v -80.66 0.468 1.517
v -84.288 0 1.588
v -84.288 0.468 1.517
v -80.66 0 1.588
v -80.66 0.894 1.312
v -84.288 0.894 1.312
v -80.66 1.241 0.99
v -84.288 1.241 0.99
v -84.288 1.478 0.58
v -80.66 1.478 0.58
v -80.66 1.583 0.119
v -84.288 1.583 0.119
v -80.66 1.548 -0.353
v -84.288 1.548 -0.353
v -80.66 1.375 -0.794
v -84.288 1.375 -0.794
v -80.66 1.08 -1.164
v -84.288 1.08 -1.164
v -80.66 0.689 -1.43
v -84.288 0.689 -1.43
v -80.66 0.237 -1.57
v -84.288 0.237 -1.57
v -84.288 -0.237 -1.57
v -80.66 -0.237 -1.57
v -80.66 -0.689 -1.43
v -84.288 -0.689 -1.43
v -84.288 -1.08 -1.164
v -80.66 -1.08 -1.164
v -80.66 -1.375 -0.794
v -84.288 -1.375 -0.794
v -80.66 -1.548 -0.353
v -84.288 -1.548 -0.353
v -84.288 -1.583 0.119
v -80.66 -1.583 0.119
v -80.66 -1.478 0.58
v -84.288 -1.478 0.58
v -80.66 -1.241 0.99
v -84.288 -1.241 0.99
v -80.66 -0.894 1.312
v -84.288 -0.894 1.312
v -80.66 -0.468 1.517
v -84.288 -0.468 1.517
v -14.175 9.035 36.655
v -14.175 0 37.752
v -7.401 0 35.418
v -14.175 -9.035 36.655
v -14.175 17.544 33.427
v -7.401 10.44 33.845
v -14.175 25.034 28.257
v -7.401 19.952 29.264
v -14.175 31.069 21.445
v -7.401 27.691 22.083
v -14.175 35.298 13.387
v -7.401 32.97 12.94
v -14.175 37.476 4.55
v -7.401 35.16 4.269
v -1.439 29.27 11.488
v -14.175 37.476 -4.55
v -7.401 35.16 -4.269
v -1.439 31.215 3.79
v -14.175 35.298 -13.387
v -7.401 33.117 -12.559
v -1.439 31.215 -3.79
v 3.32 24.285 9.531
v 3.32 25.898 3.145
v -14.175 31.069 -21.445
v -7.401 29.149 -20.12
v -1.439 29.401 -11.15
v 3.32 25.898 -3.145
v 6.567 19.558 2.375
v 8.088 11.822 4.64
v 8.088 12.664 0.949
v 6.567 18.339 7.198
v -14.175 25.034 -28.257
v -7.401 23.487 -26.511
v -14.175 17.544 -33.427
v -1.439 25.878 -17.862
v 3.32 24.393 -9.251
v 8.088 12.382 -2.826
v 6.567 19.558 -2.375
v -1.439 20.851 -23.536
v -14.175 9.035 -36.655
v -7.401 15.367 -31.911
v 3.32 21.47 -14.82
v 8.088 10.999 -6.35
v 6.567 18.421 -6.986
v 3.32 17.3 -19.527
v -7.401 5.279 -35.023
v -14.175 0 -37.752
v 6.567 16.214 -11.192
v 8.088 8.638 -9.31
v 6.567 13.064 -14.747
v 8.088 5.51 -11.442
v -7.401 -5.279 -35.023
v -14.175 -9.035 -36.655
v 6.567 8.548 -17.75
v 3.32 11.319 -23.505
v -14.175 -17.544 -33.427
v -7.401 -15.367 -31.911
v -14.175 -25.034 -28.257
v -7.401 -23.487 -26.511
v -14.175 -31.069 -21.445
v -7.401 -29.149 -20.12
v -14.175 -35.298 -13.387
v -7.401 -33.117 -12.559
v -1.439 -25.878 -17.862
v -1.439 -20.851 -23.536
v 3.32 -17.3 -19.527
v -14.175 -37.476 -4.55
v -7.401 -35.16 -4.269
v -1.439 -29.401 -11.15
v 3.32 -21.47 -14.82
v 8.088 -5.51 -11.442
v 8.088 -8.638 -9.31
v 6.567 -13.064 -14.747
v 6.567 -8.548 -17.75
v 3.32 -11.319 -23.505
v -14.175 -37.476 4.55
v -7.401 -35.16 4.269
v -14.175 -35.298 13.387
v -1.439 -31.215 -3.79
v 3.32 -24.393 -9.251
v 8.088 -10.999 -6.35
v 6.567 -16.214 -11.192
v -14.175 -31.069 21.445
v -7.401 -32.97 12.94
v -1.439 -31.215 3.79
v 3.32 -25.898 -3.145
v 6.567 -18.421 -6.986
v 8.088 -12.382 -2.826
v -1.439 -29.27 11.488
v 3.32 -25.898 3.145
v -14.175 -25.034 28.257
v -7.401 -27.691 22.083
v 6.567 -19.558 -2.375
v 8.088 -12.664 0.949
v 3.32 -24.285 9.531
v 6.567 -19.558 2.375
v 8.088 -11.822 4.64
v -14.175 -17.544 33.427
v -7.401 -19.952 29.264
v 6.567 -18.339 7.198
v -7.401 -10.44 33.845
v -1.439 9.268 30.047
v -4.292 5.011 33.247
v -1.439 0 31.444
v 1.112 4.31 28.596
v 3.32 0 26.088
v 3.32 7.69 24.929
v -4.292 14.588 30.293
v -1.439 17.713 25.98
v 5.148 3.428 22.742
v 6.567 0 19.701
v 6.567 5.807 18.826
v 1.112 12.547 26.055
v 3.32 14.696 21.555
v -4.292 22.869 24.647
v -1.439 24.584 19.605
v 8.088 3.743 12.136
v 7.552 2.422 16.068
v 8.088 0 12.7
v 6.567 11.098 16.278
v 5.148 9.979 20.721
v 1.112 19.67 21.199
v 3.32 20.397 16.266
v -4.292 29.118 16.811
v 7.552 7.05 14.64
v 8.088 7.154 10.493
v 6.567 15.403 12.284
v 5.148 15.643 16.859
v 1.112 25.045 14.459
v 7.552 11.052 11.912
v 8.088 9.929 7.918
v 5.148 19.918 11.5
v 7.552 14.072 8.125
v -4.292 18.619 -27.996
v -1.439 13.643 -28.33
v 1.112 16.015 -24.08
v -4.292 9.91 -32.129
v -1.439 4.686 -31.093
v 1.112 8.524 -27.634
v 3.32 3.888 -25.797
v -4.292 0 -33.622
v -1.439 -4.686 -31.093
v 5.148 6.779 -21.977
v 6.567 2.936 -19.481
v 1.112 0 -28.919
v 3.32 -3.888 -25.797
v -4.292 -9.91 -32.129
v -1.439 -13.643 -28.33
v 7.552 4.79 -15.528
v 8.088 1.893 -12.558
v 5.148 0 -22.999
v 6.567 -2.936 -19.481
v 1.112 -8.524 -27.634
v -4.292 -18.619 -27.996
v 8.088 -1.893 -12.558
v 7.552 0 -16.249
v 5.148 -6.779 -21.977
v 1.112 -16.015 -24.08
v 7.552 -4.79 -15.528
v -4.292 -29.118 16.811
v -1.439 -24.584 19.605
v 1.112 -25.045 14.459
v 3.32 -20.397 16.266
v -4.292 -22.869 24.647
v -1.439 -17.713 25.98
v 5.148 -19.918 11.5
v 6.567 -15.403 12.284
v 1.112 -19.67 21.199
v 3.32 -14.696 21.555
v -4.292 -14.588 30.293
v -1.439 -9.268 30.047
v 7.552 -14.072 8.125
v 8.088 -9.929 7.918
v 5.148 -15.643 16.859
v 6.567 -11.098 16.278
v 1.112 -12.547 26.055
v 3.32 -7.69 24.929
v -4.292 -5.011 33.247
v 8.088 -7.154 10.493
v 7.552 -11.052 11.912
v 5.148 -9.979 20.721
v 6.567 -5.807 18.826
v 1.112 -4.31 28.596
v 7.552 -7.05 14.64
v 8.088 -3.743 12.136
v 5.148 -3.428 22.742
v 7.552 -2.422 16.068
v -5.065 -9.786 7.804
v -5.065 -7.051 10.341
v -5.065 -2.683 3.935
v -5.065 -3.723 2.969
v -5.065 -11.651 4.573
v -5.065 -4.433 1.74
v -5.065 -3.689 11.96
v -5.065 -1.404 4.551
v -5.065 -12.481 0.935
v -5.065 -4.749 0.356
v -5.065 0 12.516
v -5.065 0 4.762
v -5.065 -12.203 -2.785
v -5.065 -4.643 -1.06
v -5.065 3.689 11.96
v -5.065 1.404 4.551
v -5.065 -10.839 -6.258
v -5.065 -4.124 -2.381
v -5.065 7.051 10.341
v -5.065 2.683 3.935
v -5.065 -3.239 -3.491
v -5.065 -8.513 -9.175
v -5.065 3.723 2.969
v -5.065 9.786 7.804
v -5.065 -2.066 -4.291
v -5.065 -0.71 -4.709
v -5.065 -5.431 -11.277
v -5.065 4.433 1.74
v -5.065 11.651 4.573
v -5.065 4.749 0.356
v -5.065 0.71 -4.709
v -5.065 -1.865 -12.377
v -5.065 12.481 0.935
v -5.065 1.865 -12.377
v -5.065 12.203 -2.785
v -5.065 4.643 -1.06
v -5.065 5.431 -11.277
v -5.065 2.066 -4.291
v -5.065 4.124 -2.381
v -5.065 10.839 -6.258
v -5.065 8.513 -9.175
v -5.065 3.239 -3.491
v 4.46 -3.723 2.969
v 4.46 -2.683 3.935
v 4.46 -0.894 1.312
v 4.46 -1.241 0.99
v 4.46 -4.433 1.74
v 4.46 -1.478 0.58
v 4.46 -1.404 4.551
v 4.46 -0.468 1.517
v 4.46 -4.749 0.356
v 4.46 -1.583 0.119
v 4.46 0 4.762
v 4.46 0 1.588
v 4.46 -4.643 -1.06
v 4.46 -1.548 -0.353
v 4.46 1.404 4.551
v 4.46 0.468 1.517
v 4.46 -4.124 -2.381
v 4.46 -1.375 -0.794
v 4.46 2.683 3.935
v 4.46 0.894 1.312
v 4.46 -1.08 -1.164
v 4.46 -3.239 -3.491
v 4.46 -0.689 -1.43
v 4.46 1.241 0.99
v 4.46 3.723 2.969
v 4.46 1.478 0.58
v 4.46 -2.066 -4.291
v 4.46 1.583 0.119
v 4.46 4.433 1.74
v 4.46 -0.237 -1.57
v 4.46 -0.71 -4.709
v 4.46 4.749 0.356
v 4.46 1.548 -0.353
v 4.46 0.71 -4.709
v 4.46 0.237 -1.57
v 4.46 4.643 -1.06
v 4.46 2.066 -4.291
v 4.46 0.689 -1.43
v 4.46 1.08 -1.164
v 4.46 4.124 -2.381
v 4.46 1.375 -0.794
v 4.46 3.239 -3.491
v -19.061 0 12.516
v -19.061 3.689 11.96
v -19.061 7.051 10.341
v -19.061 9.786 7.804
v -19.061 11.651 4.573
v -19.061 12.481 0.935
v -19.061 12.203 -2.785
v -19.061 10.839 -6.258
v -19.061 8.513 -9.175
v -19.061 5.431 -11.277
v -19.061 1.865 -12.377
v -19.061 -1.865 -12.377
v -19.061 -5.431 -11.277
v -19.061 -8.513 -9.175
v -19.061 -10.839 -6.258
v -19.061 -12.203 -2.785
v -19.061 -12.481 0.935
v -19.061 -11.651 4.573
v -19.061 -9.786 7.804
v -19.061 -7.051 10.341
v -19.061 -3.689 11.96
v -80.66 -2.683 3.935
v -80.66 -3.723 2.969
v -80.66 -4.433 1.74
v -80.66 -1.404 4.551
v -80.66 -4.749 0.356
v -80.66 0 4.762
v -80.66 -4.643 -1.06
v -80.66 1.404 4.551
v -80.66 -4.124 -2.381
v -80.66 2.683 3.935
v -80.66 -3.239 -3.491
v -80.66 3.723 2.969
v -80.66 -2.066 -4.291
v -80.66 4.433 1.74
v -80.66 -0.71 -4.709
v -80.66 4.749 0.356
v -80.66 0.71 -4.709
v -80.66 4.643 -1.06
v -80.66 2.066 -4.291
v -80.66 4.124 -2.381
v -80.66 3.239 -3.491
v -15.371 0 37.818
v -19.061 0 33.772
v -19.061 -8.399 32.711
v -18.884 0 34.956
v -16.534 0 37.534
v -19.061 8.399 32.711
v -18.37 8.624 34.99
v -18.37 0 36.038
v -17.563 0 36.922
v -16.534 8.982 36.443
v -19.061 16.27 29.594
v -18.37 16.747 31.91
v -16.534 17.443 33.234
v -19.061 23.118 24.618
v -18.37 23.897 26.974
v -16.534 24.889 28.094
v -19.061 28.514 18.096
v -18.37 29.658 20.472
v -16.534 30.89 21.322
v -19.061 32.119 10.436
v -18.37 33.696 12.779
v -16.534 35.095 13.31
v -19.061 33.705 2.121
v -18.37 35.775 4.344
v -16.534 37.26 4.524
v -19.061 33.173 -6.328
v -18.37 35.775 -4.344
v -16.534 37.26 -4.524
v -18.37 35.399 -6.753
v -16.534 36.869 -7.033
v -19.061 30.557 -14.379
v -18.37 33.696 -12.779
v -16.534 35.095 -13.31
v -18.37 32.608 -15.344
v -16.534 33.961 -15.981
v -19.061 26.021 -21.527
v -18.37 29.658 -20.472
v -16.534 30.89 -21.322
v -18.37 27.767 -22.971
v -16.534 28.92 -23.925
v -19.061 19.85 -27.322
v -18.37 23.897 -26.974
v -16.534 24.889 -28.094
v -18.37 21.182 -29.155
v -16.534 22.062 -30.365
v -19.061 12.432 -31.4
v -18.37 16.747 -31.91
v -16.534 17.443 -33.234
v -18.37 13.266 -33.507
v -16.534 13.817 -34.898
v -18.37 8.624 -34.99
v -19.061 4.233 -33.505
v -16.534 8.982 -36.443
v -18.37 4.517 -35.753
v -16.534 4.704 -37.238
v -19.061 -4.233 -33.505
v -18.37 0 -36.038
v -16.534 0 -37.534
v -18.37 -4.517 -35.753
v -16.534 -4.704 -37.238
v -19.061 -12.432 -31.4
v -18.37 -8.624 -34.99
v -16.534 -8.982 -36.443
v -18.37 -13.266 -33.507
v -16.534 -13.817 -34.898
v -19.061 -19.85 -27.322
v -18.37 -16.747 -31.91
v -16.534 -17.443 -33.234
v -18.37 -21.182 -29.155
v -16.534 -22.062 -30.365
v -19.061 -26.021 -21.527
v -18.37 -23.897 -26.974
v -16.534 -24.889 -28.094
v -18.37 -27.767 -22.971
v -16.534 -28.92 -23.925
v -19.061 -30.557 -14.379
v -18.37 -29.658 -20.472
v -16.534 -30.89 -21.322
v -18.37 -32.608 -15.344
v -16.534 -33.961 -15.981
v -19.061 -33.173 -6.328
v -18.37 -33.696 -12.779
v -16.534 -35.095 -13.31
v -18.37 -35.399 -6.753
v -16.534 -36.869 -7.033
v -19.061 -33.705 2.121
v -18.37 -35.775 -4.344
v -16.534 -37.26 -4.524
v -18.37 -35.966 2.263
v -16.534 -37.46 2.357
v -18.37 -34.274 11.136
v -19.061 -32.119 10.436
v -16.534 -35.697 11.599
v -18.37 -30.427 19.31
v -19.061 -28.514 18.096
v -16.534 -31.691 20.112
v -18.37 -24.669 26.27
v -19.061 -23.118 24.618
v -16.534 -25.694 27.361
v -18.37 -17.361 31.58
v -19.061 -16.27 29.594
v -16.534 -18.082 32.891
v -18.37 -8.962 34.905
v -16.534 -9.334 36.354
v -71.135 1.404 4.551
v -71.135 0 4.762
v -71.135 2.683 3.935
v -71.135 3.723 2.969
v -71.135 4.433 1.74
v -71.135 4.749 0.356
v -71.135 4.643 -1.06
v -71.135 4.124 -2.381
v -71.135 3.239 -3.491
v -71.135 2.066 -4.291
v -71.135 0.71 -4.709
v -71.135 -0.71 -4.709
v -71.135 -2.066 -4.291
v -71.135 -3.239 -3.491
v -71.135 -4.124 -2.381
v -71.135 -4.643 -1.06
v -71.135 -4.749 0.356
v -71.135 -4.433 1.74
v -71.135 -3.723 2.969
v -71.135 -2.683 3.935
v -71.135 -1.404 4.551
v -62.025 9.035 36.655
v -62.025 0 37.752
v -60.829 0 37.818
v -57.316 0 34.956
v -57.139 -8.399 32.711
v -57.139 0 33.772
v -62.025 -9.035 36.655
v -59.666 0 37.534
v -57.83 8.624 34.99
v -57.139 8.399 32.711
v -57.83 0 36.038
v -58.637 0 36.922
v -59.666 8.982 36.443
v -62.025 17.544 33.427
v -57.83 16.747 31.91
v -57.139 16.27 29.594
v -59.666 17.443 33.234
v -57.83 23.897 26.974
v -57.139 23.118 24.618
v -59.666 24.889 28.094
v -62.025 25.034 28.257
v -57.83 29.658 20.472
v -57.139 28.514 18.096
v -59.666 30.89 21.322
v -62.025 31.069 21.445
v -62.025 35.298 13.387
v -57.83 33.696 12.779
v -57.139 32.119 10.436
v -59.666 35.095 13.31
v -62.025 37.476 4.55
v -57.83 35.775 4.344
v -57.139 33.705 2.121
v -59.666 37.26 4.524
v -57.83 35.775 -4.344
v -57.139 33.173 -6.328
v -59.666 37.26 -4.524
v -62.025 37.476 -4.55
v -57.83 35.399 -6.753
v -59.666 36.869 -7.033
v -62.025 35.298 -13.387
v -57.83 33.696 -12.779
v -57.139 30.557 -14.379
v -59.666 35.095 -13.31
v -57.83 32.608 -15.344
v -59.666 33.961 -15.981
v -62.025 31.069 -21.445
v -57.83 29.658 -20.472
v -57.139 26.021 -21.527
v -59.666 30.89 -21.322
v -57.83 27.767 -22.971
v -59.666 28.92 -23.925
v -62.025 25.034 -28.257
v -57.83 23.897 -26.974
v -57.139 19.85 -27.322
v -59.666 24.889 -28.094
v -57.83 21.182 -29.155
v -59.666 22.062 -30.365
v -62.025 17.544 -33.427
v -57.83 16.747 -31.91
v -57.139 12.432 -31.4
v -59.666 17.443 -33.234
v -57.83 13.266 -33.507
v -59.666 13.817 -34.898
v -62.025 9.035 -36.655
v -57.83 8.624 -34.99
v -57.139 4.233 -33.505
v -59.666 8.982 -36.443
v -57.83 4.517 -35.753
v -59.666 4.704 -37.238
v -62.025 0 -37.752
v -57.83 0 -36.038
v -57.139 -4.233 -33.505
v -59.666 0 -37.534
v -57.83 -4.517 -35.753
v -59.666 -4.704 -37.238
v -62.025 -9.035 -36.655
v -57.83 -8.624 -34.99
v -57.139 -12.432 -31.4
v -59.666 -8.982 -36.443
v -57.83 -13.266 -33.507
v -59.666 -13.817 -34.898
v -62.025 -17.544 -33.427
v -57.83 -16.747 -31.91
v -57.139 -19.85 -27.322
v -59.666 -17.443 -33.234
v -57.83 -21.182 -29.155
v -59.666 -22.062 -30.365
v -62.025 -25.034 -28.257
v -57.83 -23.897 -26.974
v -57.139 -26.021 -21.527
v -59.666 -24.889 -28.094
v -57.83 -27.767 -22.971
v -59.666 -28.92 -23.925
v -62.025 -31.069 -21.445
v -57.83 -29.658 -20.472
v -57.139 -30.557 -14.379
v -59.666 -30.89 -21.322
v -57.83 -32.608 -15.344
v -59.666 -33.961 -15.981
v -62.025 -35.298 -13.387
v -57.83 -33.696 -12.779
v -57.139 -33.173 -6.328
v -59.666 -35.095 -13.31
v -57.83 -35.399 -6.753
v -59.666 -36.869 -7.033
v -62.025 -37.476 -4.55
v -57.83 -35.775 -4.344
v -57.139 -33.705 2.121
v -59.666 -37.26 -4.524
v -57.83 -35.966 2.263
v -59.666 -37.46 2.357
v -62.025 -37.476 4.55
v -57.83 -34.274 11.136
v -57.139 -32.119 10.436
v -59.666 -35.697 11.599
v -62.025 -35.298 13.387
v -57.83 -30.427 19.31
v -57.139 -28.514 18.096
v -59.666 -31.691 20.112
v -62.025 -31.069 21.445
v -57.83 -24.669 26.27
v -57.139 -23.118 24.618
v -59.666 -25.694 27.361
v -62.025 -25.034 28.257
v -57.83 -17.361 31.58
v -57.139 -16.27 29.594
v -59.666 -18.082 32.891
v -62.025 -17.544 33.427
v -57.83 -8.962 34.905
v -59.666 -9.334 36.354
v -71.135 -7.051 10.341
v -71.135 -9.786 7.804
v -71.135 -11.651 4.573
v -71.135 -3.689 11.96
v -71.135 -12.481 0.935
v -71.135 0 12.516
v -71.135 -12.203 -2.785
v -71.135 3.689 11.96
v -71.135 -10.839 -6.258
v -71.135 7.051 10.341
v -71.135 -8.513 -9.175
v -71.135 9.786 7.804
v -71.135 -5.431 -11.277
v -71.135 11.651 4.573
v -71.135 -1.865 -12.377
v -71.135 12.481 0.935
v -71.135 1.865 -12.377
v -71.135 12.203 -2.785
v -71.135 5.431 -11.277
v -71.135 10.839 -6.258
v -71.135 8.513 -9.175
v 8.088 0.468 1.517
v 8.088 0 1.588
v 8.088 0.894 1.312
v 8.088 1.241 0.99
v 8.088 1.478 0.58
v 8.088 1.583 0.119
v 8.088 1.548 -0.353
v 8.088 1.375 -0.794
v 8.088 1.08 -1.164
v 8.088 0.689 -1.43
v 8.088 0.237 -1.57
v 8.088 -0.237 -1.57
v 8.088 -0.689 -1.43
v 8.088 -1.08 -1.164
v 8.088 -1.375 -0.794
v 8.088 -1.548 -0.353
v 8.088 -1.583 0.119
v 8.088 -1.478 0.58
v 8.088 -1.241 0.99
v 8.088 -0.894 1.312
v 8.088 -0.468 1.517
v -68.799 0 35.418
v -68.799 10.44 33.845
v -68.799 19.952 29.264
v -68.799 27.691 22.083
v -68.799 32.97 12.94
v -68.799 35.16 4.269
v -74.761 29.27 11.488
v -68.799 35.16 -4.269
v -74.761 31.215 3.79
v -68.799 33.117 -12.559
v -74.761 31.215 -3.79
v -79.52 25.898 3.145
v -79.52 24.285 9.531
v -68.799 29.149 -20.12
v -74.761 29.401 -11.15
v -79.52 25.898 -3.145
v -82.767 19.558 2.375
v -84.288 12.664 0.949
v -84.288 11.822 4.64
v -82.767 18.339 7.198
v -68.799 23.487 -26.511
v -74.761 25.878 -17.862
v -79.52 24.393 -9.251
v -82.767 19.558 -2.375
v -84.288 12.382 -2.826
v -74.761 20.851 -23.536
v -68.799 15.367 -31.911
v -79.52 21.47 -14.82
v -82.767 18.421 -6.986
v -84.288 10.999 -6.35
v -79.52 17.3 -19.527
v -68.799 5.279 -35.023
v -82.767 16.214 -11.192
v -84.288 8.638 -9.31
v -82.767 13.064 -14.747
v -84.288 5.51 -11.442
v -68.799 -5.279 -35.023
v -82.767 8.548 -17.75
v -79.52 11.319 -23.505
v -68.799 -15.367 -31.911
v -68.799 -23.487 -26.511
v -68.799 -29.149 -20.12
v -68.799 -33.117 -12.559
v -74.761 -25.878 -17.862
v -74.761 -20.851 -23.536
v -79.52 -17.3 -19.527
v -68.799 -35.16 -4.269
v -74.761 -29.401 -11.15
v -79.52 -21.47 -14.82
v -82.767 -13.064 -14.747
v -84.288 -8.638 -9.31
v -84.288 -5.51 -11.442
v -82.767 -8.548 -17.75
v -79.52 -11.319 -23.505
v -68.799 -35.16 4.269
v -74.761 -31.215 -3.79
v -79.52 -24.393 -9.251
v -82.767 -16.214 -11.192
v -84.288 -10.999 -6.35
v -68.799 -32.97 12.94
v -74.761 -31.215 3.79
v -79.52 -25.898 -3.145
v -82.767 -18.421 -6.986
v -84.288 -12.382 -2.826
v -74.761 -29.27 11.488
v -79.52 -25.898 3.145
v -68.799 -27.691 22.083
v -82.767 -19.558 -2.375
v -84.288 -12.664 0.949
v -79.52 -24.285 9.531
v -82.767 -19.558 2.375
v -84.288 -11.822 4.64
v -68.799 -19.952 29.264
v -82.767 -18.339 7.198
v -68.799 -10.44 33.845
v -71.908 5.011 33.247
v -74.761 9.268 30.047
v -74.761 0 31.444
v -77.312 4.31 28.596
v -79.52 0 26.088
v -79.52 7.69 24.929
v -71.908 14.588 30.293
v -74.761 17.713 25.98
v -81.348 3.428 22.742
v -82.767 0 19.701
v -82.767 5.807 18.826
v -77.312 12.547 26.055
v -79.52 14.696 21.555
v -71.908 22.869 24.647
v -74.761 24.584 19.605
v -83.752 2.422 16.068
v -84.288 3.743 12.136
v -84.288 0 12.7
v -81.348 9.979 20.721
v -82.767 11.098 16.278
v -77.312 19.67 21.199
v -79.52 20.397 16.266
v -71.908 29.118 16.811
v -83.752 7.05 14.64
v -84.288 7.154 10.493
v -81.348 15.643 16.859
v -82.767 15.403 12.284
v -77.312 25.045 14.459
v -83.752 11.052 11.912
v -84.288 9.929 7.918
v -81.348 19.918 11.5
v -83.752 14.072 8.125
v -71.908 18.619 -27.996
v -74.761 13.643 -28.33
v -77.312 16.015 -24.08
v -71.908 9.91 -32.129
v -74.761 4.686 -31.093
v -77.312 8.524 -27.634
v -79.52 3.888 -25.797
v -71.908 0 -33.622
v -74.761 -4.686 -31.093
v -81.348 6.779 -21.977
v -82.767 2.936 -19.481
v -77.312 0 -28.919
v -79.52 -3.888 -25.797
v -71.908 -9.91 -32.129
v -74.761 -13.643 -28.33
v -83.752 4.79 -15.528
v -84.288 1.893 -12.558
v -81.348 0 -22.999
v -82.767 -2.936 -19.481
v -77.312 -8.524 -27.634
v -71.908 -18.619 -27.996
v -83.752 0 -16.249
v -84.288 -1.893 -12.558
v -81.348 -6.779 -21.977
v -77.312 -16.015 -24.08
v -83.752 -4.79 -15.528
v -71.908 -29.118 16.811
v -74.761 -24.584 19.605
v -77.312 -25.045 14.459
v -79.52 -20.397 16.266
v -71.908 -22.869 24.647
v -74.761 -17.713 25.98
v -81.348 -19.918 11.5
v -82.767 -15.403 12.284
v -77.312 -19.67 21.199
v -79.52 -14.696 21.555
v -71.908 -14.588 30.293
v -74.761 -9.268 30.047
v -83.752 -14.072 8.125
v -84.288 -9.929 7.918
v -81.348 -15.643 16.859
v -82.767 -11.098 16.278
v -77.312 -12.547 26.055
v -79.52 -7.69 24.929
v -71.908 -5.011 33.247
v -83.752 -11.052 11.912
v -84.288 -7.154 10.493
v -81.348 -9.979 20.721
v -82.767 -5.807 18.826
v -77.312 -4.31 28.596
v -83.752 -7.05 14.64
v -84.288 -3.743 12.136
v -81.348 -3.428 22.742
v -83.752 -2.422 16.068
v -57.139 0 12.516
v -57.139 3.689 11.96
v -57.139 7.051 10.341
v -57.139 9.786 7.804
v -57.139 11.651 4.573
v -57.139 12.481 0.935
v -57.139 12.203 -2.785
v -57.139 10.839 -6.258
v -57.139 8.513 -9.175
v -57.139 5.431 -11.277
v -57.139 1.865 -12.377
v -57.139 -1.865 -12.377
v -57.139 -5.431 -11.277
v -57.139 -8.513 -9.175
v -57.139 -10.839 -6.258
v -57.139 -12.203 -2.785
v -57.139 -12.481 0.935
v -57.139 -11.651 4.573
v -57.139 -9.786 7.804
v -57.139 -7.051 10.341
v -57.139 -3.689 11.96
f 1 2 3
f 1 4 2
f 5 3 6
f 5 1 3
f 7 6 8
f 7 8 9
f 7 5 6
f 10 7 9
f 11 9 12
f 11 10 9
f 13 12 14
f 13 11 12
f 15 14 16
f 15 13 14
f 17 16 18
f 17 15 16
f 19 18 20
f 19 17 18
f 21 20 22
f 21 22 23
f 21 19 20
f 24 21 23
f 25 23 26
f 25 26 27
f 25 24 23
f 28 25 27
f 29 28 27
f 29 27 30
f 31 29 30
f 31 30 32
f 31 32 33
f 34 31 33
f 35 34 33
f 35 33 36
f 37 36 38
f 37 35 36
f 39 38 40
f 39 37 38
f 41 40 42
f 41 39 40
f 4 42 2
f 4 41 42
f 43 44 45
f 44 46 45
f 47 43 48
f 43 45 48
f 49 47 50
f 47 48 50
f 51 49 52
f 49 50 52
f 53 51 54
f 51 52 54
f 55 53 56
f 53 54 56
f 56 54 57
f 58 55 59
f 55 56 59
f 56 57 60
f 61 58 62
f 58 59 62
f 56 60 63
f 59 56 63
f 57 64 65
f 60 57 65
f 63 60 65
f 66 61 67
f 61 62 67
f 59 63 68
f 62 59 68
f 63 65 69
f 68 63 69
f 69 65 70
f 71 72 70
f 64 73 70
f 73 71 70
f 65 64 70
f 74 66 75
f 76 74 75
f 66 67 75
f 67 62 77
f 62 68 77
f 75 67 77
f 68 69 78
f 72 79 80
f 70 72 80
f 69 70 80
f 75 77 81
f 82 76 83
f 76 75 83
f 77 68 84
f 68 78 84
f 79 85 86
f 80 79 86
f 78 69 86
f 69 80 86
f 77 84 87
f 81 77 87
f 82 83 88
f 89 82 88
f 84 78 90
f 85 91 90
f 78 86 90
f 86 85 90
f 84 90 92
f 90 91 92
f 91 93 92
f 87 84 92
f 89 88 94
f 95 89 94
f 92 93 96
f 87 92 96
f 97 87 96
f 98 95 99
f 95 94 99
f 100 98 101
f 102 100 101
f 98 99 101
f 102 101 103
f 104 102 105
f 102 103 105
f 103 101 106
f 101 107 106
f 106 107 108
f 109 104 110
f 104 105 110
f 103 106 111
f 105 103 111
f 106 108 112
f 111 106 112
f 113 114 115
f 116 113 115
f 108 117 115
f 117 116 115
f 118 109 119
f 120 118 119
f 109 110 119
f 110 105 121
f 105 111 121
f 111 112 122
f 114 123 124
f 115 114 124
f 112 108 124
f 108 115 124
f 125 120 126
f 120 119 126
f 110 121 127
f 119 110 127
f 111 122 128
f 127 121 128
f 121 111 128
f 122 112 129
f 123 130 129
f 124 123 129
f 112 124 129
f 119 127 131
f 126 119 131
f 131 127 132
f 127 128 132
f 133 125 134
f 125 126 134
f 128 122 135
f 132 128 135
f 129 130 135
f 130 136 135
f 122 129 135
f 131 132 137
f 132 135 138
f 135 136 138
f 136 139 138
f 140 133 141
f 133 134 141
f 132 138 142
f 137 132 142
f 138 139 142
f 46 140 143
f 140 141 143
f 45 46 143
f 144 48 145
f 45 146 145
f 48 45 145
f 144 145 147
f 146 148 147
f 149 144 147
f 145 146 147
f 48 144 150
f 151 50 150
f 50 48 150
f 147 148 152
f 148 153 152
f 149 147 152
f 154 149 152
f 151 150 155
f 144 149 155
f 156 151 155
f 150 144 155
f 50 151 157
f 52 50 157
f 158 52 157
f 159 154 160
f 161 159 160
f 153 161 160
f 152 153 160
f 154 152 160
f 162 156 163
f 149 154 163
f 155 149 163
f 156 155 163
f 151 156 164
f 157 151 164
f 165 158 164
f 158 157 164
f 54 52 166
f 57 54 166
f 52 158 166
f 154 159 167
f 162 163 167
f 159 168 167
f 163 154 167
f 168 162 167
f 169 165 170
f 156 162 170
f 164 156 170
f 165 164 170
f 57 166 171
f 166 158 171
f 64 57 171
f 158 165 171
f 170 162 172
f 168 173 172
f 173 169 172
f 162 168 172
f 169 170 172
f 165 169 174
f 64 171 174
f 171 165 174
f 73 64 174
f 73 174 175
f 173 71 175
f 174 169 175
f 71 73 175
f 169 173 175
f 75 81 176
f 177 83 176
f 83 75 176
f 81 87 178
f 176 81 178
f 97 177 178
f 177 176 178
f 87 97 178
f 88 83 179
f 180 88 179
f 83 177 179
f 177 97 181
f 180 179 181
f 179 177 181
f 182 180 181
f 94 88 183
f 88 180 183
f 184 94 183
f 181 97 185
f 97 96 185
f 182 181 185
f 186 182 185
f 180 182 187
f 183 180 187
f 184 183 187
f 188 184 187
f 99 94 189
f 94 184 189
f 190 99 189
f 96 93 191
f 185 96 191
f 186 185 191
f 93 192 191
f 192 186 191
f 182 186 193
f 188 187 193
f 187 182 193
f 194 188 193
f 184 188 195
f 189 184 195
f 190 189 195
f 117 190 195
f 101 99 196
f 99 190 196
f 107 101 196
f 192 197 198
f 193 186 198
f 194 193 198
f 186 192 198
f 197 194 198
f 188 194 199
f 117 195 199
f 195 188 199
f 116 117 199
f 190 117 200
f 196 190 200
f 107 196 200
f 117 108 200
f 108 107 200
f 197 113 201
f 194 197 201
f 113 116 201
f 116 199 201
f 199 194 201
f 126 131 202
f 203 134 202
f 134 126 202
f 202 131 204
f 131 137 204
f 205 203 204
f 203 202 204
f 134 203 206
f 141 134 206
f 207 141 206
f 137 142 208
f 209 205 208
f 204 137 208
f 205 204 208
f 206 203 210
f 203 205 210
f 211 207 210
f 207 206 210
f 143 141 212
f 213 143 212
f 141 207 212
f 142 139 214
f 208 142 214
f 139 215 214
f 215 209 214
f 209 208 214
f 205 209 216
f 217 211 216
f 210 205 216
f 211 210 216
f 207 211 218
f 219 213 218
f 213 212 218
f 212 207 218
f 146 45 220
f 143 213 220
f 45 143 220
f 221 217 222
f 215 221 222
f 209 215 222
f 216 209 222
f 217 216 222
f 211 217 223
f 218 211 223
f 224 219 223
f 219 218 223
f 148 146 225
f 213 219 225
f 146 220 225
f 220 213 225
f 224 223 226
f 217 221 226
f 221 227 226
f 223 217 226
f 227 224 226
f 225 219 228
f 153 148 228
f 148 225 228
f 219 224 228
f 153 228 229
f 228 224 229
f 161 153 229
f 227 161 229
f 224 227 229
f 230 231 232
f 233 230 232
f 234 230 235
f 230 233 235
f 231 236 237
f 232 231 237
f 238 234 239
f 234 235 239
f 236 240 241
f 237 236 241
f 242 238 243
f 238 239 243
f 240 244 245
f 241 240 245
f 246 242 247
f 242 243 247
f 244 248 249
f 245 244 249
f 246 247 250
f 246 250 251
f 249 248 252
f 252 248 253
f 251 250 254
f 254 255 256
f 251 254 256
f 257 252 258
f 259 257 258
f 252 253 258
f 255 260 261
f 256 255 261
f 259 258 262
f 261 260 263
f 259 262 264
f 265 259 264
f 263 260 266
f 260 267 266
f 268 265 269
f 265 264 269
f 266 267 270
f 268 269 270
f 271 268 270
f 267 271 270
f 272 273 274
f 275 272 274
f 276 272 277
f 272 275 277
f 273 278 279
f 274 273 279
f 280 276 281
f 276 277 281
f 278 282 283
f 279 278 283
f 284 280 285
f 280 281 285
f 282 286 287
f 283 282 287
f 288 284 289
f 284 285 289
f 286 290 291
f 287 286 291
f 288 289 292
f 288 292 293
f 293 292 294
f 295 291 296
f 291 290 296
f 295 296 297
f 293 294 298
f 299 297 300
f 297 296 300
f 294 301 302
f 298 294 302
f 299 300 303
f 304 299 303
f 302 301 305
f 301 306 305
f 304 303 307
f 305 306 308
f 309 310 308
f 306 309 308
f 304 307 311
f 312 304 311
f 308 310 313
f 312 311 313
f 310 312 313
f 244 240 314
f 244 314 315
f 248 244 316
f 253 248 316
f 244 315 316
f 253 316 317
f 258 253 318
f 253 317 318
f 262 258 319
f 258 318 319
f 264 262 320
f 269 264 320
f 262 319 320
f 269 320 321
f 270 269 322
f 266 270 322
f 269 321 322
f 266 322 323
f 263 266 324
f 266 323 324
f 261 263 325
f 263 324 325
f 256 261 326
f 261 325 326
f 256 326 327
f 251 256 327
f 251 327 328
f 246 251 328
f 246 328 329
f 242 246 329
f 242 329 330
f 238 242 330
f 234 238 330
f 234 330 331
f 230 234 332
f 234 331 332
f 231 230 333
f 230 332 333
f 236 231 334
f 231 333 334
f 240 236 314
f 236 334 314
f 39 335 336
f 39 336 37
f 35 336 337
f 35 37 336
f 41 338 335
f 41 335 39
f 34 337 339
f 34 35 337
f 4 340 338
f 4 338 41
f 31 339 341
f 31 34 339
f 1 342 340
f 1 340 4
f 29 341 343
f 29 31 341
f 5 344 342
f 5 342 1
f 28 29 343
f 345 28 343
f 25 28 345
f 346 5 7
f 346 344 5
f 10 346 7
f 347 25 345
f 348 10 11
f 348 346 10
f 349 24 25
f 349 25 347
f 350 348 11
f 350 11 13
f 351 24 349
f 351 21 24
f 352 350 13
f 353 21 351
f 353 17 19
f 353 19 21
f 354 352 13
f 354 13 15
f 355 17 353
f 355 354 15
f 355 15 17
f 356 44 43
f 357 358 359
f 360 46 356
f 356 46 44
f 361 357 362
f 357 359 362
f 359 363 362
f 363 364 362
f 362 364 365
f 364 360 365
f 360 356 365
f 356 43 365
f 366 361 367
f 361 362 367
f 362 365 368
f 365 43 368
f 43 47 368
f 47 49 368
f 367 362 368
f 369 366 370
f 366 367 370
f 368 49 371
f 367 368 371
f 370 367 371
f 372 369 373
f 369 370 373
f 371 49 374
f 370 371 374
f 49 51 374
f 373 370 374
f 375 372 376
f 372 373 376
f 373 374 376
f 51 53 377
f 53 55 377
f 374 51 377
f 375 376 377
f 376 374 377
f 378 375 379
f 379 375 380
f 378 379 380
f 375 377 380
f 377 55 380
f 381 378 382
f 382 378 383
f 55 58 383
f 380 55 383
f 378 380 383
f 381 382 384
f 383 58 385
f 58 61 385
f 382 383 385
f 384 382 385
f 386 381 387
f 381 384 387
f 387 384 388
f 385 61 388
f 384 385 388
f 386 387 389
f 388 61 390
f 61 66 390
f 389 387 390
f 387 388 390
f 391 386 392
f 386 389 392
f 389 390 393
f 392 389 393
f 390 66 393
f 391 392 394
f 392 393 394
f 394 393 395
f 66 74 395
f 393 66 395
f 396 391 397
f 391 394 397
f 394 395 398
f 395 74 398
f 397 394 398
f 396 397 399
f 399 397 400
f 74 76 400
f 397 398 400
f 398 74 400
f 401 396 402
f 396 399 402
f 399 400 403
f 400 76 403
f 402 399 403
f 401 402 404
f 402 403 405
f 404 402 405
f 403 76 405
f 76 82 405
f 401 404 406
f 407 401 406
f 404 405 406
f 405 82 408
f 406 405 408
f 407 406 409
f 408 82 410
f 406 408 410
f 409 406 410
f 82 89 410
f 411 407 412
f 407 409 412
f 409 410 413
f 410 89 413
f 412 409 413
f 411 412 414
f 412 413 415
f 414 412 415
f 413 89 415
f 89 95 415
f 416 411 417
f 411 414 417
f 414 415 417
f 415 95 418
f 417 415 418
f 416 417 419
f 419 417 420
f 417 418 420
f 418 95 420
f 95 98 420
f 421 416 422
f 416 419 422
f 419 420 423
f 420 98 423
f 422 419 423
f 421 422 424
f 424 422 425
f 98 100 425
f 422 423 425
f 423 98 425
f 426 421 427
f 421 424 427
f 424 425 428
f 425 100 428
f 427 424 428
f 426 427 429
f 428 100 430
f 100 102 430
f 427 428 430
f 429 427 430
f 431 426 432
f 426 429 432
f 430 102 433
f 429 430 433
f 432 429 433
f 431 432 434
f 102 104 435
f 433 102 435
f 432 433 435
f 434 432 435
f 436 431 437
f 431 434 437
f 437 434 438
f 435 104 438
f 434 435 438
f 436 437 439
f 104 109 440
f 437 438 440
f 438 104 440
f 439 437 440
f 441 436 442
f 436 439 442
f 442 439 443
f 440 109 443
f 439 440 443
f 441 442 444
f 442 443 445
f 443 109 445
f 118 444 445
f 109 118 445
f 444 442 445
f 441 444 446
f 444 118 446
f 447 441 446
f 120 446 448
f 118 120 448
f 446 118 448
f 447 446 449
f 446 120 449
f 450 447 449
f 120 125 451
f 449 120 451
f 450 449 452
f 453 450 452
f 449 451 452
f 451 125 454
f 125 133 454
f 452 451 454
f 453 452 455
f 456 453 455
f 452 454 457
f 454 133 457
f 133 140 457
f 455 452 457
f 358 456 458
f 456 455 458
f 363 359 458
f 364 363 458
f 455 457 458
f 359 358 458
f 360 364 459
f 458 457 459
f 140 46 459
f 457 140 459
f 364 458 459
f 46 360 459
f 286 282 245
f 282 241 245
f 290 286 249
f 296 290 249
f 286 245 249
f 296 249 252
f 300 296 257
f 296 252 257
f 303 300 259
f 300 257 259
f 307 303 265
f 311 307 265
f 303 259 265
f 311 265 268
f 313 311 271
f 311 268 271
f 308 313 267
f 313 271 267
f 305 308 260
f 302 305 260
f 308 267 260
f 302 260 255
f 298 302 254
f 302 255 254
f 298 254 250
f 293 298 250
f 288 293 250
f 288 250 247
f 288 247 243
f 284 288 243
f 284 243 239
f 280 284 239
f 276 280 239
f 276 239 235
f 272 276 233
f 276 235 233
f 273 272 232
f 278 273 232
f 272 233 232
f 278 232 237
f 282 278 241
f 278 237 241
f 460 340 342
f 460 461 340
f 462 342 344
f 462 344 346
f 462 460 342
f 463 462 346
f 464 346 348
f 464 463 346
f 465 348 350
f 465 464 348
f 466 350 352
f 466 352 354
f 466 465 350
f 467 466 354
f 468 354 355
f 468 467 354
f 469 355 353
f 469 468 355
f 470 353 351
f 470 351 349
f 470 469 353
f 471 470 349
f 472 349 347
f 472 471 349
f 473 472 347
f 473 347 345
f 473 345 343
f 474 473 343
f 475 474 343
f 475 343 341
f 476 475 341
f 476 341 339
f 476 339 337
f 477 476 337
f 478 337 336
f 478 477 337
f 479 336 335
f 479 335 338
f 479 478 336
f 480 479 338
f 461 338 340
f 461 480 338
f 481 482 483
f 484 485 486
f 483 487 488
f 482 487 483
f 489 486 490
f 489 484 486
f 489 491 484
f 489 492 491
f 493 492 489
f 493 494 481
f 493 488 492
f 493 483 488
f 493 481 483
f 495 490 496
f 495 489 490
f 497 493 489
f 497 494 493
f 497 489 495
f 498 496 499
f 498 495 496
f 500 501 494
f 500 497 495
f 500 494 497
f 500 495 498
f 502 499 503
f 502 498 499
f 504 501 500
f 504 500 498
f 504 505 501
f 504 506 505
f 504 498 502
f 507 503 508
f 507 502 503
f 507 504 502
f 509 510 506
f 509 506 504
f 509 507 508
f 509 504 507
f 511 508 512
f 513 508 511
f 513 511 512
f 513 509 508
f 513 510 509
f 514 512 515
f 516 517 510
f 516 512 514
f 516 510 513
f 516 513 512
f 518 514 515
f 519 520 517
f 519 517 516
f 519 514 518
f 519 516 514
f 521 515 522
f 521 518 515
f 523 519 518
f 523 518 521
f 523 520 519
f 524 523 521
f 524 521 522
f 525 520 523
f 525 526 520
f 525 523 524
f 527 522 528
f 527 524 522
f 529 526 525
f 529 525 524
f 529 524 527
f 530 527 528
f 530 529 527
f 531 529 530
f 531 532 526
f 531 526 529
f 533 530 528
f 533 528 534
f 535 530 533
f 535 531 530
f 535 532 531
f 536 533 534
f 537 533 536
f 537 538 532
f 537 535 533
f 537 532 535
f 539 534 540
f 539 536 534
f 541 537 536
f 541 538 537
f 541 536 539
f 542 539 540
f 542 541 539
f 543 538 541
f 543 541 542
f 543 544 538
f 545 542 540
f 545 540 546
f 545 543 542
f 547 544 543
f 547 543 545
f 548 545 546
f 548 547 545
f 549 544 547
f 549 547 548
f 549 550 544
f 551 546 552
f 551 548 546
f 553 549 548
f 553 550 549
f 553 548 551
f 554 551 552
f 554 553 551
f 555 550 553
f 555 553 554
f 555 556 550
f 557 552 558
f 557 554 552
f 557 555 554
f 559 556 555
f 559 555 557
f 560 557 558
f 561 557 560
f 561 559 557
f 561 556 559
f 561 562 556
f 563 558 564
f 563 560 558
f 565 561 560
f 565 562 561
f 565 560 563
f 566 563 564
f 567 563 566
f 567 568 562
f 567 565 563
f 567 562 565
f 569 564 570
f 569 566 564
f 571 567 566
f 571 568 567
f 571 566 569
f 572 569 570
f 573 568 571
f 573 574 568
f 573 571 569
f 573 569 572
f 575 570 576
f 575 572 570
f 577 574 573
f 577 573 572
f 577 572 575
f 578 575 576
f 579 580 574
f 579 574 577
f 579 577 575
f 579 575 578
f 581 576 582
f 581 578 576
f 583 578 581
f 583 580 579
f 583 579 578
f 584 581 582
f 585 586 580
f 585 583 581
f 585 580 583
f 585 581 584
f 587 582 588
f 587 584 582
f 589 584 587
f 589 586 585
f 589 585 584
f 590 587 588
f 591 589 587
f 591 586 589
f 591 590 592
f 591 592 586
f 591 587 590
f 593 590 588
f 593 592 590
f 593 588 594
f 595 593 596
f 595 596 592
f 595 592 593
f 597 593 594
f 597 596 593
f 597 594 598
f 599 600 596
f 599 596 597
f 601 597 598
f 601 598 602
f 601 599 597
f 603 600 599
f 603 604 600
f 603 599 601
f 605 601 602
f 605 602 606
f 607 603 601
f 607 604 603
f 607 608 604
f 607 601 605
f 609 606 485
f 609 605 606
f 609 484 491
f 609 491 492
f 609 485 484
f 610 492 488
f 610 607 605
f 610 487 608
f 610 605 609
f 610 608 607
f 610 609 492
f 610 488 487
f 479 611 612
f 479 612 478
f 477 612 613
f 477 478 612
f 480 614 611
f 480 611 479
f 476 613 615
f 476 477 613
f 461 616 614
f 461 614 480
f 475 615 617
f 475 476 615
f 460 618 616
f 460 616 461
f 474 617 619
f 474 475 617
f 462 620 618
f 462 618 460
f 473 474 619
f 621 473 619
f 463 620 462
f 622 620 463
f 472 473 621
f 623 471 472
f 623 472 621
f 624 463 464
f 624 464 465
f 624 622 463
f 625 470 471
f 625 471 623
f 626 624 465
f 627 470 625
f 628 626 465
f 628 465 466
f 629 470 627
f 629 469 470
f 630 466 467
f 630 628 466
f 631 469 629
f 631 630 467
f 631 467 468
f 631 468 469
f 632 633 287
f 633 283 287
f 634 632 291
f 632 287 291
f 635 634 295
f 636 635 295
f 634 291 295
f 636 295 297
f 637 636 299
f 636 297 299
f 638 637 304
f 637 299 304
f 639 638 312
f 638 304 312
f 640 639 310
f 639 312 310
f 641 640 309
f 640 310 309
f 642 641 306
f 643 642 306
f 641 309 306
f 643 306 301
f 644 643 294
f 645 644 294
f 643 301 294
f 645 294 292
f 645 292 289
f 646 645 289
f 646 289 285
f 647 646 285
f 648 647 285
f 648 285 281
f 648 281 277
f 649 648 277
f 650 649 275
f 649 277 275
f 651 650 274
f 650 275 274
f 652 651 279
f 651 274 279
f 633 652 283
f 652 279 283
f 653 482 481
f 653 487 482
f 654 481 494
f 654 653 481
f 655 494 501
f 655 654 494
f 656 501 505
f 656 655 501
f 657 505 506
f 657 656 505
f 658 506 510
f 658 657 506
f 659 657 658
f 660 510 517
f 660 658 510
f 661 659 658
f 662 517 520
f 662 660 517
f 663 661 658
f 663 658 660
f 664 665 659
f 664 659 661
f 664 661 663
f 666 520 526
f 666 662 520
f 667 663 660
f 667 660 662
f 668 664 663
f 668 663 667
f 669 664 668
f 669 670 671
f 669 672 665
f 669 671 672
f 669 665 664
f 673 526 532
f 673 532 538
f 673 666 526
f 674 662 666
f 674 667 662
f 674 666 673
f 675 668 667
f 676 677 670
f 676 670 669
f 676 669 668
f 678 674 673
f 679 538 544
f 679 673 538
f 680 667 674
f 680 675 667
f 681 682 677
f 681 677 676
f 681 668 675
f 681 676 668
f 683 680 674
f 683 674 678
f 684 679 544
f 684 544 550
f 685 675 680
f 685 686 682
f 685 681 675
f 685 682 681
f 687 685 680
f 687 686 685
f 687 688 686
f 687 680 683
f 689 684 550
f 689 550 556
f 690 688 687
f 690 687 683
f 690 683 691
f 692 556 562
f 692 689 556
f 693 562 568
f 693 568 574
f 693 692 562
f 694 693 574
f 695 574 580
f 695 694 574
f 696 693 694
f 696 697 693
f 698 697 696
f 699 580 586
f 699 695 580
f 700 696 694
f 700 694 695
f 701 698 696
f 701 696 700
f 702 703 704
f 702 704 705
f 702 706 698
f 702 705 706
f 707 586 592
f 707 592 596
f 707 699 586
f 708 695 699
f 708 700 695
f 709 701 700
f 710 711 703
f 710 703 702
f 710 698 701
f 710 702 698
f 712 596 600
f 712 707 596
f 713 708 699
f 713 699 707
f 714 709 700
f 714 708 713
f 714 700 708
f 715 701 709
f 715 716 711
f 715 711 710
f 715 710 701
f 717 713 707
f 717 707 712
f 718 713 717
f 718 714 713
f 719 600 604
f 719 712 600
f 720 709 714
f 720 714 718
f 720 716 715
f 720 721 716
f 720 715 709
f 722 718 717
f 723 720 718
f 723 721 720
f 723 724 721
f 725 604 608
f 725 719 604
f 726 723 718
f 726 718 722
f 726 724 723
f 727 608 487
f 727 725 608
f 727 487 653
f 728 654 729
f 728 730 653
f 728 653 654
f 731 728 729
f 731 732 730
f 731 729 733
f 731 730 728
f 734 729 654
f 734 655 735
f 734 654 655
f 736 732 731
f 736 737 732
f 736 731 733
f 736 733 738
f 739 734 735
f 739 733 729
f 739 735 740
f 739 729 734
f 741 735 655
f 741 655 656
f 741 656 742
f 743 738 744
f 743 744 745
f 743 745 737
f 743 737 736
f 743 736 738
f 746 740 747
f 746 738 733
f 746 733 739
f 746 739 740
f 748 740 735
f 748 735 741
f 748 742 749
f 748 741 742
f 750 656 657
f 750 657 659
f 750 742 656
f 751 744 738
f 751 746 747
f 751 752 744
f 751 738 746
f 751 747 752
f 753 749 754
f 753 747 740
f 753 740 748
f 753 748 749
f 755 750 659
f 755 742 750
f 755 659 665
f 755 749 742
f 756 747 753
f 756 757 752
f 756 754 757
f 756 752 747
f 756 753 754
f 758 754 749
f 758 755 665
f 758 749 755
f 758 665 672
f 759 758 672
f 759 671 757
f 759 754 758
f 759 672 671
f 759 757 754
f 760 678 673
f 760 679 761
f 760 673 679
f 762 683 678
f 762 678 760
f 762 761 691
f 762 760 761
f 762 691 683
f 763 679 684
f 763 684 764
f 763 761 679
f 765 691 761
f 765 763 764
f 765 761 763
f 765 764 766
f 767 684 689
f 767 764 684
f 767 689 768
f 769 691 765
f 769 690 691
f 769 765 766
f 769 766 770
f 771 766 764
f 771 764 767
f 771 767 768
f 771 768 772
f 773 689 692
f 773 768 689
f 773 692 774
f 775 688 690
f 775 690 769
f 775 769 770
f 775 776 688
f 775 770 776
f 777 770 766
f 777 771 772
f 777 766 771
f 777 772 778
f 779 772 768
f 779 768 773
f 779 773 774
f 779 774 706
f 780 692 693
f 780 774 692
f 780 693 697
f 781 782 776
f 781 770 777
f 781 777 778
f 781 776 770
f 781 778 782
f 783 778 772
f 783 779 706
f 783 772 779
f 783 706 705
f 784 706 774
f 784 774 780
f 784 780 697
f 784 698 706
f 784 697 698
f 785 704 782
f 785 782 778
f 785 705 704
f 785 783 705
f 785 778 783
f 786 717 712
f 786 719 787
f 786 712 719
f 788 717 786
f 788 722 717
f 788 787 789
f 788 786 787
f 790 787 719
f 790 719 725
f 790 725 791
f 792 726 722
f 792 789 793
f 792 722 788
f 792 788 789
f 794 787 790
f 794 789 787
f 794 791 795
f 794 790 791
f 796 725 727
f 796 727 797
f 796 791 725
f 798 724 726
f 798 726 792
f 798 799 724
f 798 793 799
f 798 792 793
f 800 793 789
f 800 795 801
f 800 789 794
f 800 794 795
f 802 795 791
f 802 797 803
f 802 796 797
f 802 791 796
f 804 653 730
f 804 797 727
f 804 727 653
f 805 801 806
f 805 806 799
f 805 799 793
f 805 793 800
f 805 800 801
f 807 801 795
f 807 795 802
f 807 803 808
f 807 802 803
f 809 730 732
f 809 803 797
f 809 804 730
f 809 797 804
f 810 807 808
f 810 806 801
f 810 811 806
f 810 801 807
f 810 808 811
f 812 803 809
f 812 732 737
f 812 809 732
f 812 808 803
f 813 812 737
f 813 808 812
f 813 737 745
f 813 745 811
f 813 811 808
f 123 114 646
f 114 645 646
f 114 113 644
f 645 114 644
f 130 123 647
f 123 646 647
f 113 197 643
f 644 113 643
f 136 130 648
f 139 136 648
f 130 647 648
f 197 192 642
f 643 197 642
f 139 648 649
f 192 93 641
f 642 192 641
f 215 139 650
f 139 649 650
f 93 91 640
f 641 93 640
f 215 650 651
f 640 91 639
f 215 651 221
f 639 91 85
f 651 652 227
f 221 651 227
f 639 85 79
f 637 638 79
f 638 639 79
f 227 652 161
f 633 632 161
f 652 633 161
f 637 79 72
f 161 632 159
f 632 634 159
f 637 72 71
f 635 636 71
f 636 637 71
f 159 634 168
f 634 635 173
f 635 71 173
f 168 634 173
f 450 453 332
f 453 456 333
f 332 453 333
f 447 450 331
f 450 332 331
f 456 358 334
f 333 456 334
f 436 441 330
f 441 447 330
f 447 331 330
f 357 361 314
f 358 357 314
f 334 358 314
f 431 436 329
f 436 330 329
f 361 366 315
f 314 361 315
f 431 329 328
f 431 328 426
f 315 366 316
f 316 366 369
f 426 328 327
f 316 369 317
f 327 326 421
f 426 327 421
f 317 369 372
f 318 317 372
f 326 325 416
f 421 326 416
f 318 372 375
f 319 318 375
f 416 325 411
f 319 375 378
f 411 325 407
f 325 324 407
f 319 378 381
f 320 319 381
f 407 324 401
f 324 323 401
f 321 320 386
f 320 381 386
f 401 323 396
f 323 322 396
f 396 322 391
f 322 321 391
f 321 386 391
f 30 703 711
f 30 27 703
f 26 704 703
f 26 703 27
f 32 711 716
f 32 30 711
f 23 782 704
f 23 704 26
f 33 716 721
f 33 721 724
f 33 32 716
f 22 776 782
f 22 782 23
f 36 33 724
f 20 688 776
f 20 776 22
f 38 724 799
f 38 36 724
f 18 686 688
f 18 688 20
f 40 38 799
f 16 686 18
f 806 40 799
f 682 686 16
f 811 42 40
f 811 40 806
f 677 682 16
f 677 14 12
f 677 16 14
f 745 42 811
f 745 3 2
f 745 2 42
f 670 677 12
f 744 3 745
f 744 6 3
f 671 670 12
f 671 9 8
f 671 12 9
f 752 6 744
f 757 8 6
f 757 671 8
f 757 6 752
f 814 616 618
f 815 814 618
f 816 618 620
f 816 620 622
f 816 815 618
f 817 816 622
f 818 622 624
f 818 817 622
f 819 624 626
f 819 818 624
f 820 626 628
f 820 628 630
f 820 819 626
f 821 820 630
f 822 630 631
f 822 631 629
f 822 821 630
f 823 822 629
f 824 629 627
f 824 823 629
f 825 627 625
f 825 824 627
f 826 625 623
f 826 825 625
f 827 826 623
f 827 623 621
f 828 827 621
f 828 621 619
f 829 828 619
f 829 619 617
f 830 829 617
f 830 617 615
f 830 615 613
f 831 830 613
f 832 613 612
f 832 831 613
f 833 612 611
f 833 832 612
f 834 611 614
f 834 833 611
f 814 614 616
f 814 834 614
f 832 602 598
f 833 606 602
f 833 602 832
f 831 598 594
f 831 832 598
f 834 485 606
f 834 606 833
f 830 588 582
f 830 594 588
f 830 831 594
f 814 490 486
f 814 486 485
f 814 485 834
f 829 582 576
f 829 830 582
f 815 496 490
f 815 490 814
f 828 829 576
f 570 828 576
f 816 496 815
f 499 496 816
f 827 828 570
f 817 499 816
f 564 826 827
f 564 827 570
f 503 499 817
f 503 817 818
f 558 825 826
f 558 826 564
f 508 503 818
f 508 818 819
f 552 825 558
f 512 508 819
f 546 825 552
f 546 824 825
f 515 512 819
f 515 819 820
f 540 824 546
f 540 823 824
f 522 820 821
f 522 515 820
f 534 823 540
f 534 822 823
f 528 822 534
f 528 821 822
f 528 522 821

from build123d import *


with BuildPart() as f2:
    # F0 (on Front) → F2 (revolve)
    with BuildSketch(Plane.XZ):
        with BuildLine():
            Line((-80.659864, 1.5875), (-80.659864, 4.7625))
            Line((-80.659864, 4.7625), (-71.134864, 4.7625))
            Line((-71.134864, 4.7625), (-71.134864, 12.516351))
            Line((-71.134864, 12.516351), (-57.139464, 12.516351))
            Line((-57.139464, 12.516351), (-57.139464, 33.771543))
            ThreePointArc((-57.139464, 33.771543), (-58.636664, 36.922358), (-62.02511, 37.751618))
            ThreePointArc((-62.02511, 37.751618), (-77.312231, 28.918913), (-84.287874, 12.7))
            Line((-84.287874, 12.7), (-84.287874, 1.5875))
            Line((-84.287874, 1.5875), (-80.659864, 1.5875))
        make_face()
    revolve(axis=Axis((-70.746966, 0, 0), (-1, 0, 0)))


with BuildPart() as f3_1:
    # F3: instance of F2
    add(f2.part.mirror(Plane.YZ.offset(-38.1)))


solid = Compound([f2.part, f3_1.part])
